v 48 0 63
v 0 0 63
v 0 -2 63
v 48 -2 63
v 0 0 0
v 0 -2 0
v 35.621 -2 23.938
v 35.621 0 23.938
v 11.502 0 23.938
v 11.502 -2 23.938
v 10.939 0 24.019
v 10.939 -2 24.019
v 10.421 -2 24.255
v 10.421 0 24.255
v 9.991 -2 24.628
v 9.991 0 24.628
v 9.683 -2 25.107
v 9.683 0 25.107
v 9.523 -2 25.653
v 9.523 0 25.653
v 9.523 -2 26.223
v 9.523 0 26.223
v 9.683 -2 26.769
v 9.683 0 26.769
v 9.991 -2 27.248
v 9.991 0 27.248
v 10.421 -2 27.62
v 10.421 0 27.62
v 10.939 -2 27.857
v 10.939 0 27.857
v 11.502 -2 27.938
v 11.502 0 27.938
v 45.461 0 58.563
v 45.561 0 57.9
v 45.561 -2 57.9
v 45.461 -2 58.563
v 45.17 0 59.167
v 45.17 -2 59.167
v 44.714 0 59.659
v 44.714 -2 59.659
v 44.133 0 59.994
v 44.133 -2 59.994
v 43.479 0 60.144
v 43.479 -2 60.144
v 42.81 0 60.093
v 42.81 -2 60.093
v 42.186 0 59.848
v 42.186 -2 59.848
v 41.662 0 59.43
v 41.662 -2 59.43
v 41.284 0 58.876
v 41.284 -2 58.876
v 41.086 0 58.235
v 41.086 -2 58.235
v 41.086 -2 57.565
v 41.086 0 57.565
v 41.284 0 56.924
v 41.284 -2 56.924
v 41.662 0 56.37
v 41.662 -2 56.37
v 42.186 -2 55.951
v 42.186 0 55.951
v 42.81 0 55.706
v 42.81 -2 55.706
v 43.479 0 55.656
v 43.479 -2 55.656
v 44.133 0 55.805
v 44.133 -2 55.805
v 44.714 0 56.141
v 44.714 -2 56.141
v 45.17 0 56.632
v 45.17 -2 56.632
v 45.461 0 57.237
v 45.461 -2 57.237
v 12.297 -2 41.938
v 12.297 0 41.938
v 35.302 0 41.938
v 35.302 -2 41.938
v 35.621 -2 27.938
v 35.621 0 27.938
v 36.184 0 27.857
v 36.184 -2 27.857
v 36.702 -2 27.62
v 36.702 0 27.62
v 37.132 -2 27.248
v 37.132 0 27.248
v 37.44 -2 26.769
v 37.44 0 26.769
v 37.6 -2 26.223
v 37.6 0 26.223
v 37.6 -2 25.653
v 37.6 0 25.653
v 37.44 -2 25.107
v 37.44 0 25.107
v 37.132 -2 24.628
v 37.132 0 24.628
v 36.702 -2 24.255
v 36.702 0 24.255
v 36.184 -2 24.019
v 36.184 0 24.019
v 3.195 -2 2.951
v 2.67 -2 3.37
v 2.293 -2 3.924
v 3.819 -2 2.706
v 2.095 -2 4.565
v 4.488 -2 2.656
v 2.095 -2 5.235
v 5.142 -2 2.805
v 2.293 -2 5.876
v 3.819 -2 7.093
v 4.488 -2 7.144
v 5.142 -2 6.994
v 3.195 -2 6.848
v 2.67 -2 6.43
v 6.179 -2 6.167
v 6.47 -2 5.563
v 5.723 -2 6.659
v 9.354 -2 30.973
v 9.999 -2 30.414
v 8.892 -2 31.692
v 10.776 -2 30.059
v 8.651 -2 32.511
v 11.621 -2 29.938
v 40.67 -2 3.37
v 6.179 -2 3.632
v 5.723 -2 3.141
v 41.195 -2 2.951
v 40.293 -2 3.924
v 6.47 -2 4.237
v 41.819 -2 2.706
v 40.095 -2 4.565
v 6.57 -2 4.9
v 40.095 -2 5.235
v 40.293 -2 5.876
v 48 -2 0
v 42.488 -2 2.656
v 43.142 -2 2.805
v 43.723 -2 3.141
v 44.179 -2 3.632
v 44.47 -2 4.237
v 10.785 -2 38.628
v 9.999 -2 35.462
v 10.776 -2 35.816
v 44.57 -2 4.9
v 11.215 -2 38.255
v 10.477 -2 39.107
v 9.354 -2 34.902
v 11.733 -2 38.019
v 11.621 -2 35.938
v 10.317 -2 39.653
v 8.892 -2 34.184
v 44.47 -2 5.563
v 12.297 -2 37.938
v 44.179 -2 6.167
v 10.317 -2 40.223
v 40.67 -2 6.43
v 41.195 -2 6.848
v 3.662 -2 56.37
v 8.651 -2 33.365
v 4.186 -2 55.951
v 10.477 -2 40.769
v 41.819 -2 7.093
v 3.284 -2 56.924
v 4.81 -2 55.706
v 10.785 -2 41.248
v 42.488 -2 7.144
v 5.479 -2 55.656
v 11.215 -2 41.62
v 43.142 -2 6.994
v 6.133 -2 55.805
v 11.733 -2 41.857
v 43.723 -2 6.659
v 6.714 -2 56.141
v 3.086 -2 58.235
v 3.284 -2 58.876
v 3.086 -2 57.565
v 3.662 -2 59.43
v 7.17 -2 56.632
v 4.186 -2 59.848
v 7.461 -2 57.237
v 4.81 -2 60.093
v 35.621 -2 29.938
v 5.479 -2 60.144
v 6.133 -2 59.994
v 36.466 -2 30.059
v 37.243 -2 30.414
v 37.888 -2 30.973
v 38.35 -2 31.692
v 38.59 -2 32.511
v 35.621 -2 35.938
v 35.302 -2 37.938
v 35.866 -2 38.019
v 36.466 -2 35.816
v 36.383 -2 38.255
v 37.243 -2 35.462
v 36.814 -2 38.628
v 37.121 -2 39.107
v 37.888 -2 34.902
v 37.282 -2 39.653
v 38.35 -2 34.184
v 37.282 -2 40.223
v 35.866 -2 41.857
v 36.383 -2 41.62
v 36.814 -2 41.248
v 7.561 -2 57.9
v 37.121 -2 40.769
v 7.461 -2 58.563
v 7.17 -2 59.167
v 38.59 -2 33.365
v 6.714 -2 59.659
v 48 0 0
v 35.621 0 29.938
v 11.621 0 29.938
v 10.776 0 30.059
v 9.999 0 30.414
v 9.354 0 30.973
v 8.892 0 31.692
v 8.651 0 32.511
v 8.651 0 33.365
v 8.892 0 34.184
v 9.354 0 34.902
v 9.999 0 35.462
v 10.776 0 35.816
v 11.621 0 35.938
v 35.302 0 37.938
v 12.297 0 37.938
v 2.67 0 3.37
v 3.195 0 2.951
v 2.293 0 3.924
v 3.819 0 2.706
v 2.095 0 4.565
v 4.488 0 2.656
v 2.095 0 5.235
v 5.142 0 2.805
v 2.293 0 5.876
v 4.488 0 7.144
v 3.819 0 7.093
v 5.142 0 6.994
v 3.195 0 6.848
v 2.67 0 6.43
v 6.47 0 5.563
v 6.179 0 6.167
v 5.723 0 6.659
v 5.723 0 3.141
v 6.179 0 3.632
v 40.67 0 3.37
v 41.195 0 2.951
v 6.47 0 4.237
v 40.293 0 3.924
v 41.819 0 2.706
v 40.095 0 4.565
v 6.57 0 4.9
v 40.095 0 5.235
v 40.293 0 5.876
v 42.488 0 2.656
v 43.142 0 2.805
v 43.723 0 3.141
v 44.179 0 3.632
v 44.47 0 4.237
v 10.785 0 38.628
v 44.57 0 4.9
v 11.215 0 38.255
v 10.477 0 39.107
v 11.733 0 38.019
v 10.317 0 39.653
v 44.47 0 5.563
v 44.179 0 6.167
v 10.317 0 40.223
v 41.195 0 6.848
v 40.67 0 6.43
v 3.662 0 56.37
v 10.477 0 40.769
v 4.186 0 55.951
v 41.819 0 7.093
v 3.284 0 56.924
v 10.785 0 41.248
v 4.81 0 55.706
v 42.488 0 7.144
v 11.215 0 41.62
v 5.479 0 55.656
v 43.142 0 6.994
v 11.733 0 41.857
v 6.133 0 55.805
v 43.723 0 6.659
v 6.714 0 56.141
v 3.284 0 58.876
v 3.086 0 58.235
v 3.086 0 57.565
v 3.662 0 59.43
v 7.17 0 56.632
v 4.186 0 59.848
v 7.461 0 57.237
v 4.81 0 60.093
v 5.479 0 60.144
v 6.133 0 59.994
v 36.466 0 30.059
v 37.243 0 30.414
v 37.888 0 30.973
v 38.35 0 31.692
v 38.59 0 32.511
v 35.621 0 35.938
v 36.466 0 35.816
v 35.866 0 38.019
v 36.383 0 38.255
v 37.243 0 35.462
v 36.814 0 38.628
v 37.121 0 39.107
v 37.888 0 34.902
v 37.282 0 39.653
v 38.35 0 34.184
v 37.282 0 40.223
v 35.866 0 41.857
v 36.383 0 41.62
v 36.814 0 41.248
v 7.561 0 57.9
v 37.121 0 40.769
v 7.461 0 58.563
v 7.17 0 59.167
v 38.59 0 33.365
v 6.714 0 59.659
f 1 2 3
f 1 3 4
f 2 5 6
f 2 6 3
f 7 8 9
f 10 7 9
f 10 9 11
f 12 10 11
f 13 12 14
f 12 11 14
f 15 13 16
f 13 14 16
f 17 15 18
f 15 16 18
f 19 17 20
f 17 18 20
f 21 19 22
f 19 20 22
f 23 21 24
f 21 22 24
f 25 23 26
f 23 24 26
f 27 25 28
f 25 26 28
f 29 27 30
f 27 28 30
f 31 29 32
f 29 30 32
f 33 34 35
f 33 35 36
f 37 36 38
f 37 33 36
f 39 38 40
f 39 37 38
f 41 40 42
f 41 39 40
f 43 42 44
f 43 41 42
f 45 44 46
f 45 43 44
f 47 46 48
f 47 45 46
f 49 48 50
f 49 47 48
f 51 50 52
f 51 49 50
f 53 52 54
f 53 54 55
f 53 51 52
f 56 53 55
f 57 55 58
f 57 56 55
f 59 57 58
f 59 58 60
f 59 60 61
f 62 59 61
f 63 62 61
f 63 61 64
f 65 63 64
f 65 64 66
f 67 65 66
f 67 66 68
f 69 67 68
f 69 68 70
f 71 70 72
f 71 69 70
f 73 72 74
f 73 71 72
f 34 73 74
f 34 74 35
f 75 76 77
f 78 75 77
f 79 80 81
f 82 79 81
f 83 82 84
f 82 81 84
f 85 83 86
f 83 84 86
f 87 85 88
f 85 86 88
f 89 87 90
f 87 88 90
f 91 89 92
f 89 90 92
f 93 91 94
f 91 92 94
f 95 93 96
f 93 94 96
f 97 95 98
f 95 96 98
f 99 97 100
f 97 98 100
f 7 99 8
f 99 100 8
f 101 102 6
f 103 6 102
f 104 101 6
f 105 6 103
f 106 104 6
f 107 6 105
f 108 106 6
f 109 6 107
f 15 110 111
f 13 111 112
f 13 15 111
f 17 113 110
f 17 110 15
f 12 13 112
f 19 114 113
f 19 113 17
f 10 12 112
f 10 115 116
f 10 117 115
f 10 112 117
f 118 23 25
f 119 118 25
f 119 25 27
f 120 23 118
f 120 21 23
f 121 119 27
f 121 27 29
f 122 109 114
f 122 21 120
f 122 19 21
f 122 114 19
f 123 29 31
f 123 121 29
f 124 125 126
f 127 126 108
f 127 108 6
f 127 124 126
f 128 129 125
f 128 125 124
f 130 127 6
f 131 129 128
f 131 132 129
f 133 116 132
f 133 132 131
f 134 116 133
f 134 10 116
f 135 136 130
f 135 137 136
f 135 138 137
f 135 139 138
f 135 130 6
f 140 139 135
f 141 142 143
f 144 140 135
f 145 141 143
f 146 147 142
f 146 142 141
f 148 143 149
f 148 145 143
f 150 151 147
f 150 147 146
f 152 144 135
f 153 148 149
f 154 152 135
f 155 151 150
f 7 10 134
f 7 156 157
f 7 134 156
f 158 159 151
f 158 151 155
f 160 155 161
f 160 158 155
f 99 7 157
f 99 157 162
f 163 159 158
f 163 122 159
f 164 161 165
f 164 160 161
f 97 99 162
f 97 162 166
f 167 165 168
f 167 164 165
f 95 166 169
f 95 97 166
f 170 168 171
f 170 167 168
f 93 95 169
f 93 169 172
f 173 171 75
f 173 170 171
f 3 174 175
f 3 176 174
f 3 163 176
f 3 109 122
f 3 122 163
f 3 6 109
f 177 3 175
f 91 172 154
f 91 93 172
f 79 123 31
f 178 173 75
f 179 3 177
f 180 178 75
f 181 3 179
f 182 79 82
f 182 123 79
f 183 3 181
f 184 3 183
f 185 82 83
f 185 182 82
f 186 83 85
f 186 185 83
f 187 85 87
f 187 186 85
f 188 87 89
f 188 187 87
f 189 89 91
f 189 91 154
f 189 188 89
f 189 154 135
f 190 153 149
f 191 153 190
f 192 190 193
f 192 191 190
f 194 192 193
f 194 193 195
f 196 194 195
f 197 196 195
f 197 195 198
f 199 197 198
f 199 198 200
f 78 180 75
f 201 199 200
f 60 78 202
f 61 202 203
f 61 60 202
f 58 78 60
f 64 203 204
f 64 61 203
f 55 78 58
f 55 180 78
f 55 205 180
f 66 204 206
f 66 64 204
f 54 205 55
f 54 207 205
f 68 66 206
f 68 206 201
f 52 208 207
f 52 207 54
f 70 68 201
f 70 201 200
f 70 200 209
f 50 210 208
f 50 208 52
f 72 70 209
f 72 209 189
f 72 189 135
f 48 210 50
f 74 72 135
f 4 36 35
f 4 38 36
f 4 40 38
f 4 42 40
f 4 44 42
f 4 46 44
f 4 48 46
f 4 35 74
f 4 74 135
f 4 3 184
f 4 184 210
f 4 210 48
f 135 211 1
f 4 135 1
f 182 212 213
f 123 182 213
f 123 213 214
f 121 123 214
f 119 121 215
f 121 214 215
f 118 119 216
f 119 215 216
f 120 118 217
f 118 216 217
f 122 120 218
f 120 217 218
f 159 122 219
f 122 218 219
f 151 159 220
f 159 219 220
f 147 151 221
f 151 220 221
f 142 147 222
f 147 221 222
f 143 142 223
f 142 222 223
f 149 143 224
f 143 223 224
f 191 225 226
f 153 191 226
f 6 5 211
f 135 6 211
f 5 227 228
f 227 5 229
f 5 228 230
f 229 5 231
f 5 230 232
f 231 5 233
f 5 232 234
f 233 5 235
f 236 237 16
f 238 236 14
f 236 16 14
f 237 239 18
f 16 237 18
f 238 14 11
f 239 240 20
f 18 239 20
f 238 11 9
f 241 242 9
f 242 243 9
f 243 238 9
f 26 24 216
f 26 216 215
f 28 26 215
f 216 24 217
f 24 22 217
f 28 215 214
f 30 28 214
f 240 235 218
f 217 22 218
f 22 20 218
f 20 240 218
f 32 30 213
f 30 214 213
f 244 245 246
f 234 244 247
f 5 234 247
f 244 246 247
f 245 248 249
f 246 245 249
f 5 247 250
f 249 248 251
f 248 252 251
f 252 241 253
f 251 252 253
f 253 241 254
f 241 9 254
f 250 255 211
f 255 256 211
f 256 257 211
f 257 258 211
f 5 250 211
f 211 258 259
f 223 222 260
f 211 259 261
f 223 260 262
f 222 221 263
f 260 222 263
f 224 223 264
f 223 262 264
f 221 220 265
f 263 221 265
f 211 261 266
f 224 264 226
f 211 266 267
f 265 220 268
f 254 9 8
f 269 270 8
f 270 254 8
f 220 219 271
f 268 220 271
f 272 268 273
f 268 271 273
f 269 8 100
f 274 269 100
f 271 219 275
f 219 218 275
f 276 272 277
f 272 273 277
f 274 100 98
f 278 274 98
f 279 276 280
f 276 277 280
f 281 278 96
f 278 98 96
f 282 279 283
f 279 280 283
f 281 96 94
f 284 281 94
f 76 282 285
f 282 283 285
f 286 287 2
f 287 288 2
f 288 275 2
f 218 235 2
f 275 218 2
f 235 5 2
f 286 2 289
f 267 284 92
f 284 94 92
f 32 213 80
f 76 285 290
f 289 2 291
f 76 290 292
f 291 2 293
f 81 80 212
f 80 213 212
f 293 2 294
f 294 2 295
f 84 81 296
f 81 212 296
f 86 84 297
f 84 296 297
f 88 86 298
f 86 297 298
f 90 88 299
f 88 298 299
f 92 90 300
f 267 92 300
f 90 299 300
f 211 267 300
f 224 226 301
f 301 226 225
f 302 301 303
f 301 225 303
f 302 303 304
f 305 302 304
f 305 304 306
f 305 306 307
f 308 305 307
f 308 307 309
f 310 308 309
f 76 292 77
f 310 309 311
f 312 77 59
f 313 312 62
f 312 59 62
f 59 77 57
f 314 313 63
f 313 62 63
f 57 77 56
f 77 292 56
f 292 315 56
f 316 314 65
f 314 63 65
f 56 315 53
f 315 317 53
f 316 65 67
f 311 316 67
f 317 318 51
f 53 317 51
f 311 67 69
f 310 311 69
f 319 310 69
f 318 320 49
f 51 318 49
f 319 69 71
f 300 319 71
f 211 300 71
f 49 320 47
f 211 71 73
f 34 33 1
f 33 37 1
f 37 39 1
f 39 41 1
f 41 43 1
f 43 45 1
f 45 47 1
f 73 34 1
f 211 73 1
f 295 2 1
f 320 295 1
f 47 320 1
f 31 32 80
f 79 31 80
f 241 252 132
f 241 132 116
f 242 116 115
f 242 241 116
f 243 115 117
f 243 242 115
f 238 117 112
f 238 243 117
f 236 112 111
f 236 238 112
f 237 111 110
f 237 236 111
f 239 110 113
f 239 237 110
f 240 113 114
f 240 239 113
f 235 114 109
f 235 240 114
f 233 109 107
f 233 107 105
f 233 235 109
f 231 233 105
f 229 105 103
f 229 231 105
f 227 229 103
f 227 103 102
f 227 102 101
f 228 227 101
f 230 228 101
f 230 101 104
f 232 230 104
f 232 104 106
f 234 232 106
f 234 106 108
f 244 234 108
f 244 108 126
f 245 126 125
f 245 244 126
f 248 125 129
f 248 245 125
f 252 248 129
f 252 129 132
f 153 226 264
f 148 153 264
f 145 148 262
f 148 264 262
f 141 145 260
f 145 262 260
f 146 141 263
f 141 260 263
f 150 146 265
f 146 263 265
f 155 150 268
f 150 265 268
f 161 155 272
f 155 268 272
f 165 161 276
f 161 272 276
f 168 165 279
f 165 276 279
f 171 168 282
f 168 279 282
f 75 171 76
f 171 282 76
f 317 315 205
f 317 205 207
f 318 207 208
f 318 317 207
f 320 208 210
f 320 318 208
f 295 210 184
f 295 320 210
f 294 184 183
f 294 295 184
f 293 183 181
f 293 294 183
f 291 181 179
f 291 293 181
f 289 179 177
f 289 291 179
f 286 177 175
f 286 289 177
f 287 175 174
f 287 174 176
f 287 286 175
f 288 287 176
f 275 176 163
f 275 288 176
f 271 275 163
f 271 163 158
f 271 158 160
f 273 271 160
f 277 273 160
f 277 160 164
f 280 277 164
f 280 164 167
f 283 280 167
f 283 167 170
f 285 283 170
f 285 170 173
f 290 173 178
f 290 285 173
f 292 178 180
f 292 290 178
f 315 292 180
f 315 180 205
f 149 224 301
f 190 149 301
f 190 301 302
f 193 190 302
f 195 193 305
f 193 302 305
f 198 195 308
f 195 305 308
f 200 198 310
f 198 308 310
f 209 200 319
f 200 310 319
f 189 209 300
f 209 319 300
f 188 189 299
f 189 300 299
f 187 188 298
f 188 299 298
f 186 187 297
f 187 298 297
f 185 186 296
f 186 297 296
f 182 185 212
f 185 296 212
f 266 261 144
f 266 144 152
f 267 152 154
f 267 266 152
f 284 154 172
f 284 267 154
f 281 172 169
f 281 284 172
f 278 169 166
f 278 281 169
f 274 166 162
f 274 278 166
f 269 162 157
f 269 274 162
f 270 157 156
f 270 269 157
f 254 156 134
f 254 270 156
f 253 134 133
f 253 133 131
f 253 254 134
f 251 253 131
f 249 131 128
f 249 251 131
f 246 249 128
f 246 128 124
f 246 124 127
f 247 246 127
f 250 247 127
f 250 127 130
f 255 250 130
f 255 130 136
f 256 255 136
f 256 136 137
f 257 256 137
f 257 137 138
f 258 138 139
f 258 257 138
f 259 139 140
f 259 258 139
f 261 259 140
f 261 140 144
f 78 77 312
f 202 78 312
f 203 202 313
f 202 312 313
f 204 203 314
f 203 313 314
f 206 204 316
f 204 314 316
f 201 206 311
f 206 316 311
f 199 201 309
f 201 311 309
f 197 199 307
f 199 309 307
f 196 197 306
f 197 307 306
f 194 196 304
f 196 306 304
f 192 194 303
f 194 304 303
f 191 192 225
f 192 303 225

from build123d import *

# Parameters (mm, degrees)
F0_W     = 48
F0_H     = 63
F0_R     = 2.25
F1_DEPTH = 2


with BuildPart() as f1:
    # F0 (on Front) → F1 (new body)
    with BuildSketch(Plane.XZ):
        with Locations((24, 31.5)):
            Rectangle(F0_W, F0_H)
        with Locations((4.319704, 4.899902)):
            Circle(F0_R, mode=Mode.SUBTRACT)
        with BuildLine():
            ThreePointArc((11.502249, 23.937898), (9.502249, 25.937898), (11.502249, 27.937898))
            Line((11.502249, 27.937898), (35.620832, 27.937898))
            ThreePointArc((35.620832, 27.937898), (37.620832, 25.937898), (35.620832, 23.937898))
            Line((35.620832, 23.937898), (11.502249, 23.937898))
        make_face(mode=Mode.SUBTRACT)
        with Locations((42.319704, 4.899902)):
            Circle(F0_R, mode=Mode.SUBTRACT)
        with BuildLine():
            ThreePointArc((11.620832, 29.937898), (8.620832, 32.937898), (11.620832, 35.937898))
            Line((11.620832, 35.937898), (35.620832, 35.937898))
            ThreePointArc((35.620832, 35.937898), (38.620832, 32.937898), (35.620832, 29.937898))
            Line((35.620832, 29.937898), (11.620832, 29.937898))
        make_face(mode=Mode.SUBTRACT)
        with BuildLine():
            ThreePointArc((12.296626, 37.937898), (10.296626, 39.937898), (12.296626, 41.937898))
            Line((12.296626, 41.937898), (35.302188, 41.937898))
            ThreePointArc((35.302188, 41.937898), (37.302188, 39.937898), (35.302188, 37.937898))
            Line((35.302188, 37.937898), (12.296626, 37.937898))
        make_face(mode=Mode.SUBTRACT)
        with Locations((5.310922, 57.899902)):
            Circle(F0_R, mode=Mode.SUBTRACT)
        with Locations((43.310922, 57.899902)):
            Circle(F0_R, mode=Mode.SUBTRACT)
    extrude(amount=F1_DEPTH)


solid = f1.part
